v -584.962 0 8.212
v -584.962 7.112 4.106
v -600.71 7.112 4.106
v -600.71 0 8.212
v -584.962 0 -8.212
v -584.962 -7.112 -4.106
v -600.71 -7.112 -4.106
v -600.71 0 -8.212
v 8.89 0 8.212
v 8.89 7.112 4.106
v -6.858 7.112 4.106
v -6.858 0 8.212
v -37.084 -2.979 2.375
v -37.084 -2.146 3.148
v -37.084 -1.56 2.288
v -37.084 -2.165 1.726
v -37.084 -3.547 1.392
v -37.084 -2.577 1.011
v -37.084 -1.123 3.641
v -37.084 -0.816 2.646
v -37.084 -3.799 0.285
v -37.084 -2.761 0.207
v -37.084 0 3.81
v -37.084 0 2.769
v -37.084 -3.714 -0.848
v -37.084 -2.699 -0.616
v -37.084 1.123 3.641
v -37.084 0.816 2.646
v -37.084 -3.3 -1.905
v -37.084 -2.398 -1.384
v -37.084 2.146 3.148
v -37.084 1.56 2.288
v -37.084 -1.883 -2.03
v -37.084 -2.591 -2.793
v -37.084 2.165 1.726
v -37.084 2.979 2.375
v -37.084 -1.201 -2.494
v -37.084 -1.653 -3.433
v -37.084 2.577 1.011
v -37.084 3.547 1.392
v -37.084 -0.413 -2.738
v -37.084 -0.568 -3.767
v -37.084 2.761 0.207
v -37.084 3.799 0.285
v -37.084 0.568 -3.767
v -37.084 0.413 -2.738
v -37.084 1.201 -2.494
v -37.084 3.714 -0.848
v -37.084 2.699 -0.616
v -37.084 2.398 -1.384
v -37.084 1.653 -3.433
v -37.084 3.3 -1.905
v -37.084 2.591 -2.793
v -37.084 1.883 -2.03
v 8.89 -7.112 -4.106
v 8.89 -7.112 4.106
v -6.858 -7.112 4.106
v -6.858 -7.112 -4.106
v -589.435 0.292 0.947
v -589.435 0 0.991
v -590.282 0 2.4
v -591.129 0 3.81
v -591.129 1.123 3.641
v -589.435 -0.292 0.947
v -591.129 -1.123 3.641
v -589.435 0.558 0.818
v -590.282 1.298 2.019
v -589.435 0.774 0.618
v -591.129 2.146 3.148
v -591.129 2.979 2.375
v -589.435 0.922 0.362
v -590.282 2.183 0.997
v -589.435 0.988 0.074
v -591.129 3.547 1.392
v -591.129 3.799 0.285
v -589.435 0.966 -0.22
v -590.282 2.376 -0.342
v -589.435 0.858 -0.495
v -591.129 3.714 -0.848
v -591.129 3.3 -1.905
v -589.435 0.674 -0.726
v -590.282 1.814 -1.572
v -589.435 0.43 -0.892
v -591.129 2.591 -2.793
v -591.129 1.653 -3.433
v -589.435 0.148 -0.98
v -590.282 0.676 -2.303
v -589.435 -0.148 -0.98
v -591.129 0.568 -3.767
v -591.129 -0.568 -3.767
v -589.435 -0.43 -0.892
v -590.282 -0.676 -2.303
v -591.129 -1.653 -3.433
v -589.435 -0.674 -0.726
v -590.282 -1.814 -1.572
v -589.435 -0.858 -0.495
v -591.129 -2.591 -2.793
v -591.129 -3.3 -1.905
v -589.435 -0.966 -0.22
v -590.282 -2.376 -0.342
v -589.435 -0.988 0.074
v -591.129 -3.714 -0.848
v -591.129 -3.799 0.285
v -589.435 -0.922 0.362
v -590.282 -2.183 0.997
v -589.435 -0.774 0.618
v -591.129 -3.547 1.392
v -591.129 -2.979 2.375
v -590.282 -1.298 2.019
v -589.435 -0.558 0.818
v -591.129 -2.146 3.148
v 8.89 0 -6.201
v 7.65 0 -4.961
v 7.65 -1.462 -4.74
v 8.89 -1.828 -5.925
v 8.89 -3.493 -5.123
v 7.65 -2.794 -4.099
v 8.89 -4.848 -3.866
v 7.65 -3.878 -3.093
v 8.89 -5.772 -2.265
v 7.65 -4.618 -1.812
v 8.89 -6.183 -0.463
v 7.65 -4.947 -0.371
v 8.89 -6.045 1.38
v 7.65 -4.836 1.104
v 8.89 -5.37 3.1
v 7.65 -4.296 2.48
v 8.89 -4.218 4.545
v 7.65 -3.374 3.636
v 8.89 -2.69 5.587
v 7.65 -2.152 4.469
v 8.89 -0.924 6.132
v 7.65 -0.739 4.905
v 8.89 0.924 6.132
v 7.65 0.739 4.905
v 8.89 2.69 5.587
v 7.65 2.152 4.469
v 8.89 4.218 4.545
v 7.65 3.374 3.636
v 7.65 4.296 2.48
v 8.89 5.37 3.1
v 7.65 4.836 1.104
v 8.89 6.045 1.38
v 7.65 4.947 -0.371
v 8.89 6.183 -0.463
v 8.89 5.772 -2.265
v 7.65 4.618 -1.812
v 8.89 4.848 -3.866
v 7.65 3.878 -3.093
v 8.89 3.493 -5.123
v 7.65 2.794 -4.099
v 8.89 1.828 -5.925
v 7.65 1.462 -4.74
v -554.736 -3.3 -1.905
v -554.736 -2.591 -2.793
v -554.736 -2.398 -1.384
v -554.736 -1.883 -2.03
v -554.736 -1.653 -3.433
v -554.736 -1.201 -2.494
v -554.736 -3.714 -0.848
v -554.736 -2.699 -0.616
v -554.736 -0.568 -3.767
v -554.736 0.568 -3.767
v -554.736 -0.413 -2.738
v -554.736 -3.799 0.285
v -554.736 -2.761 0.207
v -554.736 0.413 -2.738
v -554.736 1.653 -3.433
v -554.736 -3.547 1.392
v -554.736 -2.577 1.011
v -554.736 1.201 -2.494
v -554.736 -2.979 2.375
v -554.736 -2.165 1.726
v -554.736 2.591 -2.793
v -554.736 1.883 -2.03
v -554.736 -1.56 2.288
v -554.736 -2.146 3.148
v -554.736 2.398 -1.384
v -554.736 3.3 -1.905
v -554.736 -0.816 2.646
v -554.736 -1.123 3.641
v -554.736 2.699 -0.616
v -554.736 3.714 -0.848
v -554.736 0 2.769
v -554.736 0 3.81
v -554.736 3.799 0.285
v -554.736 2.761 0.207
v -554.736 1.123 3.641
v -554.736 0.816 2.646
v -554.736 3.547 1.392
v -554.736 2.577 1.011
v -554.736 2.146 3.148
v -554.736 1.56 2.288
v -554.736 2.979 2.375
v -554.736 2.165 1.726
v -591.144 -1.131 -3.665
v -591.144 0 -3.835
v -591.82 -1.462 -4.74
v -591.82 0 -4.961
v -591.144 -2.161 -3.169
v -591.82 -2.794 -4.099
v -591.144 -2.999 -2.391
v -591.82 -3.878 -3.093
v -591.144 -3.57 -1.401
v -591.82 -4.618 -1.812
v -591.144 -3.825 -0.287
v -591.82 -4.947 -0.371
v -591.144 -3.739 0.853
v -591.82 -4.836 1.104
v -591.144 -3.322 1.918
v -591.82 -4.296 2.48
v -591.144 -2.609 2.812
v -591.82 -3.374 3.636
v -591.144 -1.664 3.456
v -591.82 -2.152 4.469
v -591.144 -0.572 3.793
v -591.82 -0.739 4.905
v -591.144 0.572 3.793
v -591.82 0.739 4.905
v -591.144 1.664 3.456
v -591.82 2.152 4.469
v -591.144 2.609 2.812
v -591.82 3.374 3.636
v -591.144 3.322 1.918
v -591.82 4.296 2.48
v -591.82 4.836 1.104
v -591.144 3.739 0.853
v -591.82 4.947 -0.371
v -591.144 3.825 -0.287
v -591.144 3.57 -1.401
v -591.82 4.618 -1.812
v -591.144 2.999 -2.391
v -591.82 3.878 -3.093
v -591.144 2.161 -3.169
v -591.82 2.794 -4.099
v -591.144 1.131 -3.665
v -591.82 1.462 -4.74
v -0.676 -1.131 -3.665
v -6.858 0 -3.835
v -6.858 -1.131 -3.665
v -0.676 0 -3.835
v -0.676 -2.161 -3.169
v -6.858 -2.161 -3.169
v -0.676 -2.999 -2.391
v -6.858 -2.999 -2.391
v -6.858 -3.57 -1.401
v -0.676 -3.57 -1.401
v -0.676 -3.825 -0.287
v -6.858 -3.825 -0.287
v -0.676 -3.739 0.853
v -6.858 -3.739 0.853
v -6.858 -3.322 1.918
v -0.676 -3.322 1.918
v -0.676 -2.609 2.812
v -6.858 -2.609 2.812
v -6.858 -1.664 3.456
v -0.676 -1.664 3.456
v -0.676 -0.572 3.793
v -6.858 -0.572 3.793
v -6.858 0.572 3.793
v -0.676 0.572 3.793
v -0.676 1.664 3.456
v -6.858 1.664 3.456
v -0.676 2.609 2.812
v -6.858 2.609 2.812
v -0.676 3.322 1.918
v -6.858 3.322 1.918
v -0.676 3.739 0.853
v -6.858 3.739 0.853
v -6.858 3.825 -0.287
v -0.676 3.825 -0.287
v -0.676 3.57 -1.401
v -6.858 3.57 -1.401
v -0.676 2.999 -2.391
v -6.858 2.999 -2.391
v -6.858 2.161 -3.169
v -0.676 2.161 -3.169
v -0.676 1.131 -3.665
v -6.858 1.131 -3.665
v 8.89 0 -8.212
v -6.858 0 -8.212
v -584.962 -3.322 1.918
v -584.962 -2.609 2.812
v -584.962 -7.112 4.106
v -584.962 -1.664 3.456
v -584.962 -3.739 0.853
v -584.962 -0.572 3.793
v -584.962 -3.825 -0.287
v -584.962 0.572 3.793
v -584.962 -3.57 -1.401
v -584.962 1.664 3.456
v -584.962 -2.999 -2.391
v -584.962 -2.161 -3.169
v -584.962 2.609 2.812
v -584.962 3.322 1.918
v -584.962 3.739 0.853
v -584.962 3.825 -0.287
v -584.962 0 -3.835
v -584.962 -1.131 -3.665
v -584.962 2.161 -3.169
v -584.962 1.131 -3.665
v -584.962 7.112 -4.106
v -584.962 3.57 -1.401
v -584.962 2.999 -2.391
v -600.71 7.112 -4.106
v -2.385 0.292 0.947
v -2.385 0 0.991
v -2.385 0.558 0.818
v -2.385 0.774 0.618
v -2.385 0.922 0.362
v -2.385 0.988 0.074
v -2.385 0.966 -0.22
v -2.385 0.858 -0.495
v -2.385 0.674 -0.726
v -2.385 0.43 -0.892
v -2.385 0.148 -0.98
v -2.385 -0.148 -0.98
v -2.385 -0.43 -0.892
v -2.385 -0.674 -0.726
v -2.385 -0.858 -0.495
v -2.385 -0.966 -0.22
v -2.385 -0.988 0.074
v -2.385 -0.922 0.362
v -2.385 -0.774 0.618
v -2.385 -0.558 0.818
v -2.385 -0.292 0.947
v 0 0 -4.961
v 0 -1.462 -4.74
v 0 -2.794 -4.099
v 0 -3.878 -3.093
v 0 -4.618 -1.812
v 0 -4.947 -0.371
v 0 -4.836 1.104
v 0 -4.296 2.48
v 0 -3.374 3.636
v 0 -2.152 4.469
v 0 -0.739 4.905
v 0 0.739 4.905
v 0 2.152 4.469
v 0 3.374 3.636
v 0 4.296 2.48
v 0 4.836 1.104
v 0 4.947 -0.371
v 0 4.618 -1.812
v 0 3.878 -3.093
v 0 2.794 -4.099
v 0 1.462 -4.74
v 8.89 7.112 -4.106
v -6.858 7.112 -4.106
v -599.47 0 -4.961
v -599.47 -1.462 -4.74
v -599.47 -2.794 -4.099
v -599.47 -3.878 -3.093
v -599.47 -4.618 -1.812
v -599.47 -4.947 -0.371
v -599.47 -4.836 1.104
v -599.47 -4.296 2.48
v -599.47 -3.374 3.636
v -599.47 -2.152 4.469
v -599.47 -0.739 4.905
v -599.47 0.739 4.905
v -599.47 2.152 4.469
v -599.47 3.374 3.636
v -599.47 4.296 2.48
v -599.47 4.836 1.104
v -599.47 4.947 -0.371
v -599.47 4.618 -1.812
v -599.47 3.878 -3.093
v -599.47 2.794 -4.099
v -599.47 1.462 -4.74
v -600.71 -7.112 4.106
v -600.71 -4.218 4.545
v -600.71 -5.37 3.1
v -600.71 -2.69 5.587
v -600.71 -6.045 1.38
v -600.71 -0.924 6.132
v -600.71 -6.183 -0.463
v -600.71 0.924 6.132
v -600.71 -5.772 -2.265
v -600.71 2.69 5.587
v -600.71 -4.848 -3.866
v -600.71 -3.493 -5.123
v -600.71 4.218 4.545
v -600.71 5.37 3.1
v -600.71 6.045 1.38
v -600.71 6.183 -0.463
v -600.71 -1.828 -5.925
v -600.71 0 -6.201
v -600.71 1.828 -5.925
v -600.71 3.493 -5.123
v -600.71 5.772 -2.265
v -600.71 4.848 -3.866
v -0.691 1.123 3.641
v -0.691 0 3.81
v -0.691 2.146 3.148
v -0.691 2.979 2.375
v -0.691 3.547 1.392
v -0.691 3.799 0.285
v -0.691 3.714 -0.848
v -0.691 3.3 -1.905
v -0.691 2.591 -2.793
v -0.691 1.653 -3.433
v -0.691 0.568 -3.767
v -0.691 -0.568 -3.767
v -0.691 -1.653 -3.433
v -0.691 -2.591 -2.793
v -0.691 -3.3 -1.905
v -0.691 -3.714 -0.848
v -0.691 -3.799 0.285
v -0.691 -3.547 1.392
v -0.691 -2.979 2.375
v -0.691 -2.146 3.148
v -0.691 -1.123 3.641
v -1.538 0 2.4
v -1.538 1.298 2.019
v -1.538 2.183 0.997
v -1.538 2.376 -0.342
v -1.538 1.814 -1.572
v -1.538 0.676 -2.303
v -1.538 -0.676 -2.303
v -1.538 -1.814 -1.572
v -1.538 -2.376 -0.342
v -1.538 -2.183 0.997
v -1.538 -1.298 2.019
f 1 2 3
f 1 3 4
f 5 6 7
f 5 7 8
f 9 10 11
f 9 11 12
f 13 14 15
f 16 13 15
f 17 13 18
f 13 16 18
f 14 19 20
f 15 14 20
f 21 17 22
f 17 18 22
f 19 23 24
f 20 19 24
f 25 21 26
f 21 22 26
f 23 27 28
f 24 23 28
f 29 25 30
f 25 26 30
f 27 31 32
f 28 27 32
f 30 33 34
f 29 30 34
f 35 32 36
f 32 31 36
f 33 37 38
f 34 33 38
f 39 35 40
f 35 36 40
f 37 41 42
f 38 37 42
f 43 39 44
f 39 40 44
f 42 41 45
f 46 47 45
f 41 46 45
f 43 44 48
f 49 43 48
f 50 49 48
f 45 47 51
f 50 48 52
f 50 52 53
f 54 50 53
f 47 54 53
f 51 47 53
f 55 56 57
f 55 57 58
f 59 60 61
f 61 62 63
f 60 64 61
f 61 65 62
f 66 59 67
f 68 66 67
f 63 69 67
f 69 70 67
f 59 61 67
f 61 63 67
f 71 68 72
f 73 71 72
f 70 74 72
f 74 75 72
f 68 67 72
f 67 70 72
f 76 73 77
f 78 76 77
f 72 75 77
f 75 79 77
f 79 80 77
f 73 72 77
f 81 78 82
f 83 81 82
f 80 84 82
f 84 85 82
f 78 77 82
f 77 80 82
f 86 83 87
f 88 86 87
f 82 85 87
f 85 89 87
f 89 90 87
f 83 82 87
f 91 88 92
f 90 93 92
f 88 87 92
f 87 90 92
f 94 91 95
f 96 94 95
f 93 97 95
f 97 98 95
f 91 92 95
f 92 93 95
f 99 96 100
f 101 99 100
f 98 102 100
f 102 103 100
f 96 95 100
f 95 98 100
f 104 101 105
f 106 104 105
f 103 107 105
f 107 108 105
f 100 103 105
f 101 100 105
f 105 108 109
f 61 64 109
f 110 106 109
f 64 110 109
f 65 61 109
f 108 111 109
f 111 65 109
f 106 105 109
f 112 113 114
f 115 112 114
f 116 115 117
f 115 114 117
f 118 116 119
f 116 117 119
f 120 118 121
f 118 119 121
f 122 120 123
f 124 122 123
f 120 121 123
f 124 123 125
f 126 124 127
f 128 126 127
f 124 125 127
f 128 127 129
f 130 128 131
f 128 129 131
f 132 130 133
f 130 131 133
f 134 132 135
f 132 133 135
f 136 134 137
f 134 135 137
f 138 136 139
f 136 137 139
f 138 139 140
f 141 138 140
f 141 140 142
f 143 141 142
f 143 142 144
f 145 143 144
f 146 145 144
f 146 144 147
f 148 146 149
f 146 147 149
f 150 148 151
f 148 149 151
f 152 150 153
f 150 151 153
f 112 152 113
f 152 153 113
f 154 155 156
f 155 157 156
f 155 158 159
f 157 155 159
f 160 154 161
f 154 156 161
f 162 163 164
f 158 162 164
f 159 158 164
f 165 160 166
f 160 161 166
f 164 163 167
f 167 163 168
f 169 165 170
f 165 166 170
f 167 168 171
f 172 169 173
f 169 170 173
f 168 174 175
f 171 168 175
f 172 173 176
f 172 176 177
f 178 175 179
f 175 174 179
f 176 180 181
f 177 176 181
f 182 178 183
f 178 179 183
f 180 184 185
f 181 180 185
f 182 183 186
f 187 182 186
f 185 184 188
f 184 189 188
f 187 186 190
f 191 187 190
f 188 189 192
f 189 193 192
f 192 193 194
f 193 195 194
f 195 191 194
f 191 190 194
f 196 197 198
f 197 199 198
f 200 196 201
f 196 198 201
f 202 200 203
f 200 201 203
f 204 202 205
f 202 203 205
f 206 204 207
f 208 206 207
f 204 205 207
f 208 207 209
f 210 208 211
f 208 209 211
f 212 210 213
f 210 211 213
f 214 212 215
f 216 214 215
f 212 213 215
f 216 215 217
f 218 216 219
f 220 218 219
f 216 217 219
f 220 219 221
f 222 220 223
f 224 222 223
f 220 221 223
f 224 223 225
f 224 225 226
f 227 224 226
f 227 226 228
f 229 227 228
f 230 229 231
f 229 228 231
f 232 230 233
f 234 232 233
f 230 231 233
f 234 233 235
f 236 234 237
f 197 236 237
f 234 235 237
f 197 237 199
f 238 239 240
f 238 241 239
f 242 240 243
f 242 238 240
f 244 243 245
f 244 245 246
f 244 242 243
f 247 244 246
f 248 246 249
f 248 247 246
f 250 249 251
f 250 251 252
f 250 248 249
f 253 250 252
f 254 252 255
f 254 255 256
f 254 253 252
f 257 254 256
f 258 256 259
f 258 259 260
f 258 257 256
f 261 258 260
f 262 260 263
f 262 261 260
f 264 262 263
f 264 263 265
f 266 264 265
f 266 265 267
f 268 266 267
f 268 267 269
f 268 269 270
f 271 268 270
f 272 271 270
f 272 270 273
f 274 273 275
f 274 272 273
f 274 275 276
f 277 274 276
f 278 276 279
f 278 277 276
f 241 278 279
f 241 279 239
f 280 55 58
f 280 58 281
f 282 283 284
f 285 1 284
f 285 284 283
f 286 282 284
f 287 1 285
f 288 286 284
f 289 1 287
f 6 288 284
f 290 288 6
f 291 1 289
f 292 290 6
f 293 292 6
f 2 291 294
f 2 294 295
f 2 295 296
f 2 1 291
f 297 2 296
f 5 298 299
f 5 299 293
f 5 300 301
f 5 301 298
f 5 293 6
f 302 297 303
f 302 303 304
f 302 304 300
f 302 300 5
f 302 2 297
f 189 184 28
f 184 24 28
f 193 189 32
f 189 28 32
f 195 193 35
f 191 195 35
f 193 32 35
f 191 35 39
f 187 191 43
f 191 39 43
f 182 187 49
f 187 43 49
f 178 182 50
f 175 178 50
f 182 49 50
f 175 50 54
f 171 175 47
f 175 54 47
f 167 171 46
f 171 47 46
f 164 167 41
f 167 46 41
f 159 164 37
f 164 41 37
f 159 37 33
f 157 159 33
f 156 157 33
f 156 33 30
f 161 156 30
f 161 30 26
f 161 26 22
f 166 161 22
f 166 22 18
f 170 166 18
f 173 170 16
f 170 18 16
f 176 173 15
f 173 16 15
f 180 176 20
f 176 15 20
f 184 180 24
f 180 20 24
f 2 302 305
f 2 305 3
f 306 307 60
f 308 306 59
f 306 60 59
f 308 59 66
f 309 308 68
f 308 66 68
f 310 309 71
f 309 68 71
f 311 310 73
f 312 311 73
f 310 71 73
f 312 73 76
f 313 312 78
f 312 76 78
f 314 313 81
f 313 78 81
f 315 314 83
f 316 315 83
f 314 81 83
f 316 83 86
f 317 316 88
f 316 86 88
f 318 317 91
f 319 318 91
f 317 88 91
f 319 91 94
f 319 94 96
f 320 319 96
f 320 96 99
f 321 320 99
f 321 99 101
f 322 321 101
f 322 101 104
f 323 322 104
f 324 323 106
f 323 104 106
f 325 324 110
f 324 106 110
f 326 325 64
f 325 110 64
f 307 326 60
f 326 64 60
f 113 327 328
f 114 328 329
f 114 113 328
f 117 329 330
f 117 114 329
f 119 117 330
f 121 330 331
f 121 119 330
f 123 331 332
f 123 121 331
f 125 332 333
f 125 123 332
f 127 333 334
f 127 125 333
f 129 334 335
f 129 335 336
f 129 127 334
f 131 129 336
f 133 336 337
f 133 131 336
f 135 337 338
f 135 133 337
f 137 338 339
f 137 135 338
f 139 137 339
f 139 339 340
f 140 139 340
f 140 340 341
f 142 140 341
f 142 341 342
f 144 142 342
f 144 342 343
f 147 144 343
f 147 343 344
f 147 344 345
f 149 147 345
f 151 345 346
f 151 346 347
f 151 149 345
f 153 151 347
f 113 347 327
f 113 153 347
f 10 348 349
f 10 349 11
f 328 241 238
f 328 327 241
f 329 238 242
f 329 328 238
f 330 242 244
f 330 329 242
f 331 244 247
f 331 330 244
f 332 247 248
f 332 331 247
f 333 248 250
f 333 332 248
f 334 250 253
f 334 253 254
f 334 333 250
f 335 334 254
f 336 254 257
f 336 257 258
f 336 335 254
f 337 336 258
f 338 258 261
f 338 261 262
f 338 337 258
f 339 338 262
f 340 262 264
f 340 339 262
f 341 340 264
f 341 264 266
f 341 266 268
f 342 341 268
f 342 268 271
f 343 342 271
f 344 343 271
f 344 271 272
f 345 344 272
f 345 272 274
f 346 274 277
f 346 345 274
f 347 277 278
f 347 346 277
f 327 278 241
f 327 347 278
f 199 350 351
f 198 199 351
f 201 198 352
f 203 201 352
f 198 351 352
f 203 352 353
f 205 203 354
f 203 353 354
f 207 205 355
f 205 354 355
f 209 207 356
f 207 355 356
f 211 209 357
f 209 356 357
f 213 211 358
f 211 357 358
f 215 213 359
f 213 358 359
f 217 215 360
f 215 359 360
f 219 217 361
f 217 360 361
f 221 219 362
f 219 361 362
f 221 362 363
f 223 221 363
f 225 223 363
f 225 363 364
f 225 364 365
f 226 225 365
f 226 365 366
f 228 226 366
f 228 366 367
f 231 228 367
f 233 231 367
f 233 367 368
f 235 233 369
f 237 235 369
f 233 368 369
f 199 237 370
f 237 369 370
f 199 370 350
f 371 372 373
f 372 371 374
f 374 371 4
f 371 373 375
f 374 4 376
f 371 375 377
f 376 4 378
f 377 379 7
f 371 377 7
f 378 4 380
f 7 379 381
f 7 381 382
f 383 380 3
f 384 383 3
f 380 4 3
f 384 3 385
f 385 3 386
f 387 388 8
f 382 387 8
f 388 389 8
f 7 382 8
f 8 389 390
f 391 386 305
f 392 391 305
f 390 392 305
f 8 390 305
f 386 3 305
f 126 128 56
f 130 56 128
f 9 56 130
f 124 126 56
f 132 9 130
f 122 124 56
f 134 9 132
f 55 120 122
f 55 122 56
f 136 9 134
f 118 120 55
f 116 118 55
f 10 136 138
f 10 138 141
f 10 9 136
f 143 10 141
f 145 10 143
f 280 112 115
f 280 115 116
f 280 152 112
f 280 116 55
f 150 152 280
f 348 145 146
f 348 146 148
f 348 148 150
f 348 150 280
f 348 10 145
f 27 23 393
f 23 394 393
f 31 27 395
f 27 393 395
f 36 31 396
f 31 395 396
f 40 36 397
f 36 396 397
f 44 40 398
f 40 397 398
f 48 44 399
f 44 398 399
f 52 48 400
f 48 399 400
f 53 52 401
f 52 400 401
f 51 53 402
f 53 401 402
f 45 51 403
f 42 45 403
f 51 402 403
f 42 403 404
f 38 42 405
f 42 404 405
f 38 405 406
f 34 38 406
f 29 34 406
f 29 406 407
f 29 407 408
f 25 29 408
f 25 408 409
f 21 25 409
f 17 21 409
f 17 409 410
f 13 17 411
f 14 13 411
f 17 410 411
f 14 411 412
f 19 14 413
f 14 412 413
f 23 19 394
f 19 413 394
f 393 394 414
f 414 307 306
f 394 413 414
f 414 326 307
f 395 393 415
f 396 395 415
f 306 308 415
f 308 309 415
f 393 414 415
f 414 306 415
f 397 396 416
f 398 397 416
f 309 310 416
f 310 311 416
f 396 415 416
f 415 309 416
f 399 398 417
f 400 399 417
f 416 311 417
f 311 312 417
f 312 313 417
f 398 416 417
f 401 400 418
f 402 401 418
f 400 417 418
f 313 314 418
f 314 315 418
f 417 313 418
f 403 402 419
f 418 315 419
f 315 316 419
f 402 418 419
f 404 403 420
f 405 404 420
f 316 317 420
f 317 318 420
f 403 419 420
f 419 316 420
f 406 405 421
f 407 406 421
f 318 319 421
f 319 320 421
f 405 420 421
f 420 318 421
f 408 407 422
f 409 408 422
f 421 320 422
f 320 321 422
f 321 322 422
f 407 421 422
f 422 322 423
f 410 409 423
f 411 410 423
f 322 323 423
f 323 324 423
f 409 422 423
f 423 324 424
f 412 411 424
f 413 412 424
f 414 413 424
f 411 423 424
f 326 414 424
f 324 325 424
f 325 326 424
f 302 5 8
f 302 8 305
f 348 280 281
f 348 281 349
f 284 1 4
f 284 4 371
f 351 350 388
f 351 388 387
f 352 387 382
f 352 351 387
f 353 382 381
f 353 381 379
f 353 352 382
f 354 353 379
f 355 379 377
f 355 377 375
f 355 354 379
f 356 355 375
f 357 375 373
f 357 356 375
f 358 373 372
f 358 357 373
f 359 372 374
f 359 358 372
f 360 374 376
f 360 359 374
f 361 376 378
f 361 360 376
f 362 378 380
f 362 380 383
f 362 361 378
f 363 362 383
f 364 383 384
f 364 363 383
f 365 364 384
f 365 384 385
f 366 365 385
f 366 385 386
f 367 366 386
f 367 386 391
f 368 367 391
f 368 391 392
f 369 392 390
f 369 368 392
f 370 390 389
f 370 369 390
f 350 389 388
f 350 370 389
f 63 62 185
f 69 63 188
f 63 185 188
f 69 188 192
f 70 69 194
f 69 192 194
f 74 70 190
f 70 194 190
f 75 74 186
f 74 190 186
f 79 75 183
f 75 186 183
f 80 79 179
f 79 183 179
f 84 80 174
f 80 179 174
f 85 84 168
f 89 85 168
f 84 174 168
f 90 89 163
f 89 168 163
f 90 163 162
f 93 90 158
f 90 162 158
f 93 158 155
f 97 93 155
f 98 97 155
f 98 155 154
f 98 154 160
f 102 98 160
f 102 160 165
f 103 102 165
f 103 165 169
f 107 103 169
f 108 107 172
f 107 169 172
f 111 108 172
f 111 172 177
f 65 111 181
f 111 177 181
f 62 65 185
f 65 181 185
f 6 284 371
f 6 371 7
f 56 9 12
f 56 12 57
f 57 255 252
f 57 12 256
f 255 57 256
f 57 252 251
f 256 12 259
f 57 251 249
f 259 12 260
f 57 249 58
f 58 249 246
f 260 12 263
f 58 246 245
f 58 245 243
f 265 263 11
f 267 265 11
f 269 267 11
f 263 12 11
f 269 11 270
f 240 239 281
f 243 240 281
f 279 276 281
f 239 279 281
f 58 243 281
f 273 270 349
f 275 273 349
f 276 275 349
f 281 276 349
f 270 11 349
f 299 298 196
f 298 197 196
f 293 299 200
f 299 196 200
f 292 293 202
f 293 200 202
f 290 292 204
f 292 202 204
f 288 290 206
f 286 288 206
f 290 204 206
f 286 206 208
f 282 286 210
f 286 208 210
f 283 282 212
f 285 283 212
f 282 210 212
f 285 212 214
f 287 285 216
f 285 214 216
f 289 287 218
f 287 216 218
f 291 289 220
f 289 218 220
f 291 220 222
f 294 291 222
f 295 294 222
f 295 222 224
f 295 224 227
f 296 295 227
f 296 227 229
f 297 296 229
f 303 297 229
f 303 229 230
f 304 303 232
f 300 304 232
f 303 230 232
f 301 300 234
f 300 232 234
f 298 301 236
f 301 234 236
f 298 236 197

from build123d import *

# Parameters (mm, degrees)
EXTRUDE2_DEPTH = 15.748
CHAMFER2_SIZE  = 1.240155


with BuildPart() as part:
    # Sketch5 → Extrude2 (new body)
    with BuildSketch(Plane(origin=(-6.858, 0, 0), x_dir=(0, 0, -1), z_dir=(1, 0, 0))):
        Polygon((4.106115114, 7.112), (-4.106115114, 7.112), (-8.212230229, 0), (-4.106115114, -7.112), (4.106115114, -7.112), (8.212230229, 0), align=None)
    extrude(amount=EXTRUDE2_DEPTH)

    # Sketch6 → Hole2 (revolve, cut)
    with BuildSketch(Plane(origin=(8.89, 0, 0), x_dir=(0, 0, -1), z_dir=(0, 1, 0))):
        Polygon((0, 0), (0, 15.748), (3.8354, 15.748), (3.8354, 9.566100386), (4.96062, 8.89), (4.96062, 0), align=None)
    revolve(axis=Axis((15.020023899, 0, 0), (-1, 0, 0)), mode=Mode.SUBTRACT)

    # Chamfer2
    chamfer2_edges = [part.edges().sort_by_distance(p)[0] for p in [
        (8.89, 0, 4.96062),
    ]]
    chamfer(chamfer2_edges, length=CHAMFER2_SIZE)


with BuildPart() as body_2:
    # Sketch8 → Revolve2 (revolve)
    with BuildSketch(Plane(origin=(0, 0, 0), x_dir=(-1, 0, 0), z_dir=(0, 0, -1)), mode=Mode.PRIVATE) as revolve2_sk:
        Polygon((0.691362245, 3.81), (2.385428675, 0.9906), (589.434571325, 0.9906), (591.128637755, 3.81), (554.736, 3.81), (554.736, 2.7686), (37.084, 2.7686), (37.084, 3.81), align=None)
    revolve(revolve2_sk.sketch.rotate(Axis((-0.691362245, 0, 0), (-1, 0, 0)), 270), axis=Axis((-0.691362245, 0, 0), (-1, 0, 0)))  # turned: the seam where the file's is


with BuildPart() as body_3:
    # Mirror2: mirrored copy
    add(part.part.mirror(Plane(origin=(-295.91, 0, 0), x_dir=(0, 0, 1), z_dir=(1, 0, 0))))


solid = Compound([part.part, body_2.part, body_3.part])
